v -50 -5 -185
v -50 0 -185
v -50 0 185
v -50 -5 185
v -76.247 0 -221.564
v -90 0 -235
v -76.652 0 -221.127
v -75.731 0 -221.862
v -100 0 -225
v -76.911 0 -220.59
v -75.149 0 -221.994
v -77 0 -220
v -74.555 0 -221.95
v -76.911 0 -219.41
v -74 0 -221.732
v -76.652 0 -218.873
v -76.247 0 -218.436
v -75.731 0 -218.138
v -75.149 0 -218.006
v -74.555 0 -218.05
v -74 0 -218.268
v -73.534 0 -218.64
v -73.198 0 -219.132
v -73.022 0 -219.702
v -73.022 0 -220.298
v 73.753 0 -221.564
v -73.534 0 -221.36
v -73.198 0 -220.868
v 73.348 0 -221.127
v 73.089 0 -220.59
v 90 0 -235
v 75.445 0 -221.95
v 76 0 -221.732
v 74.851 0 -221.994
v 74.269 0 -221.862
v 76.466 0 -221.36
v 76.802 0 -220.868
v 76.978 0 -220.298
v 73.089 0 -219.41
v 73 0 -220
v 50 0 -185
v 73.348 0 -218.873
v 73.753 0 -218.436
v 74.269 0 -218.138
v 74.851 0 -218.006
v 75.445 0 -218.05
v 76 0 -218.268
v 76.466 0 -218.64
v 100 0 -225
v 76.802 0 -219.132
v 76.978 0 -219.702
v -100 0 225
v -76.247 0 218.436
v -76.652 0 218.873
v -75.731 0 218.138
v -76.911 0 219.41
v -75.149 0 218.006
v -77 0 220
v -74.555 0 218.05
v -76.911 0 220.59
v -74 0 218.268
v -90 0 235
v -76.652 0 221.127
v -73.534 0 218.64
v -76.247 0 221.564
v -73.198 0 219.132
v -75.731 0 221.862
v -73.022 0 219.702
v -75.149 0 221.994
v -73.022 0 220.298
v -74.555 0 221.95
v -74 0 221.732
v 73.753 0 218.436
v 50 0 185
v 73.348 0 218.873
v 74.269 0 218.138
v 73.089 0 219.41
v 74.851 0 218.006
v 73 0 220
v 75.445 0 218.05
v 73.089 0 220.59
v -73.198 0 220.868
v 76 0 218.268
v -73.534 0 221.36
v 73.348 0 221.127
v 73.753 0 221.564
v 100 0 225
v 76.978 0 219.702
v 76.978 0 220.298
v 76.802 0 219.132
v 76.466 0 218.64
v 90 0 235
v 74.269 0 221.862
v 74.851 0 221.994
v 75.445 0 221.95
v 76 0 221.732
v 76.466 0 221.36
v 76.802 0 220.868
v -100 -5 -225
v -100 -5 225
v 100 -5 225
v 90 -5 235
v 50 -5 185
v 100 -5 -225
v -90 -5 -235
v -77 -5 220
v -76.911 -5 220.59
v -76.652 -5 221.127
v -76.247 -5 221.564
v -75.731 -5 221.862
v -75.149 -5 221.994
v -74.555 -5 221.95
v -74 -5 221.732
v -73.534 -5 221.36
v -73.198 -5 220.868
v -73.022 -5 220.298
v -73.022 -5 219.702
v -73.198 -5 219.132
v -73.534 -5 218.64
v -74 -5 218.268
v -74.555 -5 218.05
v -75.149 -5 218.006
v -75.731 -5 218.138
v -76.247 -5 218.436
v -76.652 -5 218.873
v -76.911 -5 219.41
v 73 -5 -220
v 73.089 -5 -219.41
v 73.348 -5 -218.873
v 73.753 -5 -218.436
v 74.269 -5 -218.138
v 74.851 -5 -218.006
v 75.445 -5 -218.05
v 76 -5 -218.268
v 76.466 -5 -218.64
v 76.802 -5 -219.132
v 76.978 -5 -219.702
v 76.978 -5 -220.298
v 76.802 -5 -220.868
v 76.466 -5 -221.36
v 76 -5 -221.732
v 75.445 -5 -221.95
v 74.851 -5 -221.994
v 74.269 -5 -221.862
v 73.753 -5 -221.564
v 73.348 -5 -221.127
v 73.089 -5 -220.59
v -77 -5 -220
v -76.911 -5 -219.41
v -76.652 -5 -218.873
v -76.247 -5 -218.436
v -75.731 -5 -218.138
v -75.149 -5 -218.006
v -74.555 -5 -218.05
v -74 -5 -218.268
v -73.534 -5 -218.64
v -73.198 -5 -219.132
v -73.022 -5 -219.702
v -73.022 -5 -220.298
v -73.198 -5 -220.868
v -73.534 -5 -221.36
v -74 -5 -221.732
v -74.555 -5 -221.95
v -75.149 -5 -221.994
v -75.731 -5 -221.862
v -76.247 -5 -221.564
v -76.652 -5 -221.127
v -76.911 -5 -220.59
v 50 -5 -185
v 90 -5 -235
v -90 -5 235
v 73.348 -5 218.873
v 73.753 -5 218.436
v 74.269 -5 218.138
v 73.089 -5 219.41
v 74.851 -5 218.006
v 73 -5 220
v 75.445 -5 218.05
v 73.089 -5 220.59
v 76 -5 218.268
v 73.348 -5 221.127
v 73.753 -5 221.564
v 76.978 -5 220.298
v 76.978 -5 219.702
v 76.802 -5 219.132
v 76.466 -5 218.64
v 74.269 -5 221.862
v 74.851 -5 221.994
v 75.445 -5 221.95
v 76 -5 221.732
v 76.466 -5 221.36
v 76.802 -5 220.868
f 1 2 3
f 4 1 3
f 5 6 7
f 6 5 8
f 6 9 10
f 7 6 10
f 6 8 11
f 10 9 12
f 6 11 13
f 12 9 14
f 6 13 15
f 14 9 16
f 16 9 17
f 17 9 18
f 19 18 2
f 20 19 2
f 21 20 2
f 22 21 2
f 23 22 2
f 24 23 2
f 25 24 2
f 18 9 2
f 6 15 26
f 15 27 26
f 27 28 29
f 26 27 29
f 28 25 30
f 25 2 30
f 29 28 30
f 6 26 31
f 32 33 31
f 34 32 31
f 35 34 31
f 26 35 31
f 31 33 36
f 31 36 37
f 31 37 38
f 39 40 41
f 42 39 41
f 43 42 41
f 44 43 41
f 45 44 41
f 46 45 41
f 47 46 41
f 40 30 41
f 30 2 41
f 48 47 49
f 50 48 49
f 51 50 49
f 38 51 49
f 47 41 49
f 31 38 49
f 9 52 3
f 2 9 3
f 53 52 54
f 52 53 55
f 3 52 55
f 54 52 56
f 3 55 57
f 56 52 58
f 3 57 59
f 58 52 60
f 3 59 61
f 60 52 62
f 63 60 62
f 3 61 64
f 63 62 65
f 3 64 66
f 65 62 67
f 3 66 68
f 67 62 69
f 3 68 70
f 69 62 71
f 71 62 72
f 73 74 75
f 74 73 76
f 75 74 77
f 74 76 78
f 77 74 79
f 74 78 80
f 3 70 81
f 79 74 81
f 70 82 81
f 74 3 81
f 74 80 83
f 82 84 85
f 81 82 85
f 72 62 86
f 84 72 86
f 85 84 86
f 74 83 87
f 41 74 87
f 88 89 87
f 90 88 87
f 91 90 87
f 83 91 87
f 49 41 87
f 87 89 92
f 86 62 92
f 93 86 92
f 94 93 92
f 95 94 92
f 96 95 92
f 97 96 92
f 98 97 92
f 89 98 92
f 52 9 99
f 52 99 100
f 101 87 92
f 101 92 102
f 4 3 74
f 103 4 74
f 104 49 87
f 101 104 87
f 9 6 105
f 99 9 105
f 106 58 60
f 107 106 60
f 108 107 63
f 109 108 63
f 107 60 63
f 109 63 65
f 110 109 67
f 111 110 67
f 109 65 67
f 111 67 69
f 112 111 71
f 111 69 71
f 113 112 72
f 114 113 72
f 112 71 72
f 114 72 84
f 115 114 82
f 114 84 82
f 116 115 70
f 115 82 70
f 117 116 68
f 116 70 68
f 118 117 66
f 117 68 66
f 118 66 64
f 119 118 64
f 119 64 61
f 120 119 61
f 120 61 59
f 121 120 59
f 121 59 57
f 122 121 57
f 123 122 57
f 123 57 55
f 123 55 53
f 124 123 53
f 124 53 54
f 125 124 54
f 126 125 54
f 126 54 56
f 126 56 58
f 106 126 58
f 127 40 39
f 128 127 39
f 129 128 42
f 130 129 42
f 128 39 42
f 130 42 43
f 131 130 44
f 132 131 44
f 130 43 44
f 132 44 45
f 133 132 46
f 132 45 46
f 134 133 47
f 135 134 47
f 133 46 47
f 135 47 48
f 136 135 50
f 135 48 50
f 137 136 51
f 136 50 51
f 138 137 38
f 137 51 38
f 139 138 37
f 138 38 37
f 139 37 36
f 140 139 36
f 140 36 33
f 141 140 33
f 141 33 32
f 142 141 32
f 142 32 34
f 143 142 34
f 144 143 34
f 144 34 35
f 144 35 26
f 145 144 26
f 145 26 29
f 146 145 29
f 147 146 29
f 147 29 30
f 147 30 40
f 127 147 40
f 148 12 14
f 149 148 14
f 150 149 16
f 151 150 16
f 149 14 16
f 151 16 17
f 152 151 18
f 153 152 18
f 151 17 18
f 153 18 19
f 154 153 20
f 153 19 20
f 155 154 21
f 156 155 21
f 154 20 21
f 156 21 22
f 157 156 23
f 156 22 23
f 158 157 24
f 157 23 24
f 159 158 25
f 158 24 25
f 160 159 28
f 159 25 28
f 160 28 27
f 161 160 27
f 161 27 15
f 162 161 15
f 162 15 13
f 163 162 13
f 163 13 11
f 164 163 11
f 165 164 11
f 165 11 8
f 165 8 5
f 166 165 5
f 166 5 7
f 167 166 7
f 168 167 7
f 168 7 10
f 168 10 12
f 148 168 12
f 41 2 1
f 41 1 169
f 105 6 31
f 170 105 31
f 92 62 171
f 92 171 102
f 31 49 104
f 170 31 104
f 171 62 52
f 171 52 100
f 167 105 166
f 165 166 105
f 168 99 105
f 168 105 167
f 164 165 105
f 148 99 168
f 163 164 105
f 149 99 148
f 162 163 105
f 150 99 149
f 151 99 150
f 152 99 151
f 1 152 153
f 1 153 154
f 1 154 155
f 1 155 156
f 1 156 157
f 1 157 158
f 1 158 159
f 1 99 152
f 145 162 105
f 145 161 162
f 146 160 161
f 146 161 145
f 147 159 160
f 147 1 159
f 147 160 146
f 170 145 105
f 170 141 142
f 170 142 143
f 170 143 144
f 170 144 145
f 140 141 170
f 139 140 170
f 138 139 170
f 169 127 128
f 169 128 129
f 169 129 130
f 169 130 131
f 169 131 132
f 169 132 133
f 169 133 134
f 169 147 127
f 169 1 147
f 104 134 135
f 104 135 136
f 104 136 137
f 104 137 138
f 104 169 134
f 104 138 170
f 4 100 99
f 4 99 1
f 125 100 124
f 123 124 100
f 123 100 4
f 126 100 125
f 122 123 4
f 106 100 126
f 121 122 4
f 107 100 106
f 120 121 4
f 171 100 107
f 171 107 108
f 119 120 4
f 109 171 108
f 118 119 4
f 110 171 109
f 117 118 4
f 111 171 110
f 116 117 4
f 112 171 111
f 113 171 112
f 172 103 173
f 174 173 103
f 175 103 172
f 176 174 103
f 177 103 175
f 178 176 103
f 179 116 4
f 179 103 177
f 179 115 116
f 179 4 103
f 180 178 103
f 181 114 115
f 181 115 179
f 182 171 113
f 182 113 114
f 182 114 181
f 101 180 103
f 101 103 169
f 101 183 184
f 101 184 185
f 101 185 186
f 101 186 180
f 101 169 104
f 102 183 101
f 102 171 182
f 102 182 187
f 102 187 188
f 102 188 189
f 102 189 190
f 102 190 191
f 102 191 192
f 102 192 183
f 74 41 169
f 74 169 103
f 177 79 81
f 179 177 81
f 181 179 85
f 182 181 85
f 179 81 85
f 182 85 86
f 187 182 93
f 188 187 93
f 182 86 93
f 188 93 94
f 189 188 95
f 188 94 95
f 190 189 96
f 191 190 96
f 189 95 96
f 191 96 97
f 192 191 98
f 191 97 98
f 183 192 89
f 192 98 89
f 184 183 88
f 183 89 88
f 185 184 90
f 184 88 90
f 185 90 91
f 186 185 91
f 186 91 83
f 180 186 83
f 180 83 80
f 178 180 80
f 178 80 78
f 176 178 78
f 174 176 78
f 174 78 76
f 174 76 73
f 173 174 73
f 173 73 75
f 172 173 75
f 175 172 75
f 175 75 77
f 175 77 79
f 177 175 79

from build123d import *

# Parameters (mm, degrees)
F0_W     = 200
F0_H     = 470
F0_W_2   = 100
F0_H_2   = 370
F1_DEPTH = 5
F2_SIZE  = 10
F4_D     = 4
F4_DEPTH = 8


with BuildPart() as f1:
    # F0 (on Front) → F1 (new body)
    with BuildSketch(Plane.XZ):
        Rectangle(F0_W, F0_H)
        Rectangle(F0_W_2, F0_H_2, mode=Mode.SUBTRACT)
    extrude(amount=F1_DEPTH)

    # F2
    f2_edges = [f1.edges().sort_by_distance(p)[0] for p in [
        (-100, -2.5, 235),
        (100, -2.5, 235),
        (100, -2.5, -235),
        (-100, -2.5, -235),
    ]]
    chamfer(f2_edges, length=F2_SIZE)

    # F4
    with Locations(Plane.XZ.offset(5)):
        with Locations((-75, 220), (75, 220), (-75, -220), (75, -220)):
            Hole(F4_D / 2, depth=F4_DEPTH)


solid = f1.part
